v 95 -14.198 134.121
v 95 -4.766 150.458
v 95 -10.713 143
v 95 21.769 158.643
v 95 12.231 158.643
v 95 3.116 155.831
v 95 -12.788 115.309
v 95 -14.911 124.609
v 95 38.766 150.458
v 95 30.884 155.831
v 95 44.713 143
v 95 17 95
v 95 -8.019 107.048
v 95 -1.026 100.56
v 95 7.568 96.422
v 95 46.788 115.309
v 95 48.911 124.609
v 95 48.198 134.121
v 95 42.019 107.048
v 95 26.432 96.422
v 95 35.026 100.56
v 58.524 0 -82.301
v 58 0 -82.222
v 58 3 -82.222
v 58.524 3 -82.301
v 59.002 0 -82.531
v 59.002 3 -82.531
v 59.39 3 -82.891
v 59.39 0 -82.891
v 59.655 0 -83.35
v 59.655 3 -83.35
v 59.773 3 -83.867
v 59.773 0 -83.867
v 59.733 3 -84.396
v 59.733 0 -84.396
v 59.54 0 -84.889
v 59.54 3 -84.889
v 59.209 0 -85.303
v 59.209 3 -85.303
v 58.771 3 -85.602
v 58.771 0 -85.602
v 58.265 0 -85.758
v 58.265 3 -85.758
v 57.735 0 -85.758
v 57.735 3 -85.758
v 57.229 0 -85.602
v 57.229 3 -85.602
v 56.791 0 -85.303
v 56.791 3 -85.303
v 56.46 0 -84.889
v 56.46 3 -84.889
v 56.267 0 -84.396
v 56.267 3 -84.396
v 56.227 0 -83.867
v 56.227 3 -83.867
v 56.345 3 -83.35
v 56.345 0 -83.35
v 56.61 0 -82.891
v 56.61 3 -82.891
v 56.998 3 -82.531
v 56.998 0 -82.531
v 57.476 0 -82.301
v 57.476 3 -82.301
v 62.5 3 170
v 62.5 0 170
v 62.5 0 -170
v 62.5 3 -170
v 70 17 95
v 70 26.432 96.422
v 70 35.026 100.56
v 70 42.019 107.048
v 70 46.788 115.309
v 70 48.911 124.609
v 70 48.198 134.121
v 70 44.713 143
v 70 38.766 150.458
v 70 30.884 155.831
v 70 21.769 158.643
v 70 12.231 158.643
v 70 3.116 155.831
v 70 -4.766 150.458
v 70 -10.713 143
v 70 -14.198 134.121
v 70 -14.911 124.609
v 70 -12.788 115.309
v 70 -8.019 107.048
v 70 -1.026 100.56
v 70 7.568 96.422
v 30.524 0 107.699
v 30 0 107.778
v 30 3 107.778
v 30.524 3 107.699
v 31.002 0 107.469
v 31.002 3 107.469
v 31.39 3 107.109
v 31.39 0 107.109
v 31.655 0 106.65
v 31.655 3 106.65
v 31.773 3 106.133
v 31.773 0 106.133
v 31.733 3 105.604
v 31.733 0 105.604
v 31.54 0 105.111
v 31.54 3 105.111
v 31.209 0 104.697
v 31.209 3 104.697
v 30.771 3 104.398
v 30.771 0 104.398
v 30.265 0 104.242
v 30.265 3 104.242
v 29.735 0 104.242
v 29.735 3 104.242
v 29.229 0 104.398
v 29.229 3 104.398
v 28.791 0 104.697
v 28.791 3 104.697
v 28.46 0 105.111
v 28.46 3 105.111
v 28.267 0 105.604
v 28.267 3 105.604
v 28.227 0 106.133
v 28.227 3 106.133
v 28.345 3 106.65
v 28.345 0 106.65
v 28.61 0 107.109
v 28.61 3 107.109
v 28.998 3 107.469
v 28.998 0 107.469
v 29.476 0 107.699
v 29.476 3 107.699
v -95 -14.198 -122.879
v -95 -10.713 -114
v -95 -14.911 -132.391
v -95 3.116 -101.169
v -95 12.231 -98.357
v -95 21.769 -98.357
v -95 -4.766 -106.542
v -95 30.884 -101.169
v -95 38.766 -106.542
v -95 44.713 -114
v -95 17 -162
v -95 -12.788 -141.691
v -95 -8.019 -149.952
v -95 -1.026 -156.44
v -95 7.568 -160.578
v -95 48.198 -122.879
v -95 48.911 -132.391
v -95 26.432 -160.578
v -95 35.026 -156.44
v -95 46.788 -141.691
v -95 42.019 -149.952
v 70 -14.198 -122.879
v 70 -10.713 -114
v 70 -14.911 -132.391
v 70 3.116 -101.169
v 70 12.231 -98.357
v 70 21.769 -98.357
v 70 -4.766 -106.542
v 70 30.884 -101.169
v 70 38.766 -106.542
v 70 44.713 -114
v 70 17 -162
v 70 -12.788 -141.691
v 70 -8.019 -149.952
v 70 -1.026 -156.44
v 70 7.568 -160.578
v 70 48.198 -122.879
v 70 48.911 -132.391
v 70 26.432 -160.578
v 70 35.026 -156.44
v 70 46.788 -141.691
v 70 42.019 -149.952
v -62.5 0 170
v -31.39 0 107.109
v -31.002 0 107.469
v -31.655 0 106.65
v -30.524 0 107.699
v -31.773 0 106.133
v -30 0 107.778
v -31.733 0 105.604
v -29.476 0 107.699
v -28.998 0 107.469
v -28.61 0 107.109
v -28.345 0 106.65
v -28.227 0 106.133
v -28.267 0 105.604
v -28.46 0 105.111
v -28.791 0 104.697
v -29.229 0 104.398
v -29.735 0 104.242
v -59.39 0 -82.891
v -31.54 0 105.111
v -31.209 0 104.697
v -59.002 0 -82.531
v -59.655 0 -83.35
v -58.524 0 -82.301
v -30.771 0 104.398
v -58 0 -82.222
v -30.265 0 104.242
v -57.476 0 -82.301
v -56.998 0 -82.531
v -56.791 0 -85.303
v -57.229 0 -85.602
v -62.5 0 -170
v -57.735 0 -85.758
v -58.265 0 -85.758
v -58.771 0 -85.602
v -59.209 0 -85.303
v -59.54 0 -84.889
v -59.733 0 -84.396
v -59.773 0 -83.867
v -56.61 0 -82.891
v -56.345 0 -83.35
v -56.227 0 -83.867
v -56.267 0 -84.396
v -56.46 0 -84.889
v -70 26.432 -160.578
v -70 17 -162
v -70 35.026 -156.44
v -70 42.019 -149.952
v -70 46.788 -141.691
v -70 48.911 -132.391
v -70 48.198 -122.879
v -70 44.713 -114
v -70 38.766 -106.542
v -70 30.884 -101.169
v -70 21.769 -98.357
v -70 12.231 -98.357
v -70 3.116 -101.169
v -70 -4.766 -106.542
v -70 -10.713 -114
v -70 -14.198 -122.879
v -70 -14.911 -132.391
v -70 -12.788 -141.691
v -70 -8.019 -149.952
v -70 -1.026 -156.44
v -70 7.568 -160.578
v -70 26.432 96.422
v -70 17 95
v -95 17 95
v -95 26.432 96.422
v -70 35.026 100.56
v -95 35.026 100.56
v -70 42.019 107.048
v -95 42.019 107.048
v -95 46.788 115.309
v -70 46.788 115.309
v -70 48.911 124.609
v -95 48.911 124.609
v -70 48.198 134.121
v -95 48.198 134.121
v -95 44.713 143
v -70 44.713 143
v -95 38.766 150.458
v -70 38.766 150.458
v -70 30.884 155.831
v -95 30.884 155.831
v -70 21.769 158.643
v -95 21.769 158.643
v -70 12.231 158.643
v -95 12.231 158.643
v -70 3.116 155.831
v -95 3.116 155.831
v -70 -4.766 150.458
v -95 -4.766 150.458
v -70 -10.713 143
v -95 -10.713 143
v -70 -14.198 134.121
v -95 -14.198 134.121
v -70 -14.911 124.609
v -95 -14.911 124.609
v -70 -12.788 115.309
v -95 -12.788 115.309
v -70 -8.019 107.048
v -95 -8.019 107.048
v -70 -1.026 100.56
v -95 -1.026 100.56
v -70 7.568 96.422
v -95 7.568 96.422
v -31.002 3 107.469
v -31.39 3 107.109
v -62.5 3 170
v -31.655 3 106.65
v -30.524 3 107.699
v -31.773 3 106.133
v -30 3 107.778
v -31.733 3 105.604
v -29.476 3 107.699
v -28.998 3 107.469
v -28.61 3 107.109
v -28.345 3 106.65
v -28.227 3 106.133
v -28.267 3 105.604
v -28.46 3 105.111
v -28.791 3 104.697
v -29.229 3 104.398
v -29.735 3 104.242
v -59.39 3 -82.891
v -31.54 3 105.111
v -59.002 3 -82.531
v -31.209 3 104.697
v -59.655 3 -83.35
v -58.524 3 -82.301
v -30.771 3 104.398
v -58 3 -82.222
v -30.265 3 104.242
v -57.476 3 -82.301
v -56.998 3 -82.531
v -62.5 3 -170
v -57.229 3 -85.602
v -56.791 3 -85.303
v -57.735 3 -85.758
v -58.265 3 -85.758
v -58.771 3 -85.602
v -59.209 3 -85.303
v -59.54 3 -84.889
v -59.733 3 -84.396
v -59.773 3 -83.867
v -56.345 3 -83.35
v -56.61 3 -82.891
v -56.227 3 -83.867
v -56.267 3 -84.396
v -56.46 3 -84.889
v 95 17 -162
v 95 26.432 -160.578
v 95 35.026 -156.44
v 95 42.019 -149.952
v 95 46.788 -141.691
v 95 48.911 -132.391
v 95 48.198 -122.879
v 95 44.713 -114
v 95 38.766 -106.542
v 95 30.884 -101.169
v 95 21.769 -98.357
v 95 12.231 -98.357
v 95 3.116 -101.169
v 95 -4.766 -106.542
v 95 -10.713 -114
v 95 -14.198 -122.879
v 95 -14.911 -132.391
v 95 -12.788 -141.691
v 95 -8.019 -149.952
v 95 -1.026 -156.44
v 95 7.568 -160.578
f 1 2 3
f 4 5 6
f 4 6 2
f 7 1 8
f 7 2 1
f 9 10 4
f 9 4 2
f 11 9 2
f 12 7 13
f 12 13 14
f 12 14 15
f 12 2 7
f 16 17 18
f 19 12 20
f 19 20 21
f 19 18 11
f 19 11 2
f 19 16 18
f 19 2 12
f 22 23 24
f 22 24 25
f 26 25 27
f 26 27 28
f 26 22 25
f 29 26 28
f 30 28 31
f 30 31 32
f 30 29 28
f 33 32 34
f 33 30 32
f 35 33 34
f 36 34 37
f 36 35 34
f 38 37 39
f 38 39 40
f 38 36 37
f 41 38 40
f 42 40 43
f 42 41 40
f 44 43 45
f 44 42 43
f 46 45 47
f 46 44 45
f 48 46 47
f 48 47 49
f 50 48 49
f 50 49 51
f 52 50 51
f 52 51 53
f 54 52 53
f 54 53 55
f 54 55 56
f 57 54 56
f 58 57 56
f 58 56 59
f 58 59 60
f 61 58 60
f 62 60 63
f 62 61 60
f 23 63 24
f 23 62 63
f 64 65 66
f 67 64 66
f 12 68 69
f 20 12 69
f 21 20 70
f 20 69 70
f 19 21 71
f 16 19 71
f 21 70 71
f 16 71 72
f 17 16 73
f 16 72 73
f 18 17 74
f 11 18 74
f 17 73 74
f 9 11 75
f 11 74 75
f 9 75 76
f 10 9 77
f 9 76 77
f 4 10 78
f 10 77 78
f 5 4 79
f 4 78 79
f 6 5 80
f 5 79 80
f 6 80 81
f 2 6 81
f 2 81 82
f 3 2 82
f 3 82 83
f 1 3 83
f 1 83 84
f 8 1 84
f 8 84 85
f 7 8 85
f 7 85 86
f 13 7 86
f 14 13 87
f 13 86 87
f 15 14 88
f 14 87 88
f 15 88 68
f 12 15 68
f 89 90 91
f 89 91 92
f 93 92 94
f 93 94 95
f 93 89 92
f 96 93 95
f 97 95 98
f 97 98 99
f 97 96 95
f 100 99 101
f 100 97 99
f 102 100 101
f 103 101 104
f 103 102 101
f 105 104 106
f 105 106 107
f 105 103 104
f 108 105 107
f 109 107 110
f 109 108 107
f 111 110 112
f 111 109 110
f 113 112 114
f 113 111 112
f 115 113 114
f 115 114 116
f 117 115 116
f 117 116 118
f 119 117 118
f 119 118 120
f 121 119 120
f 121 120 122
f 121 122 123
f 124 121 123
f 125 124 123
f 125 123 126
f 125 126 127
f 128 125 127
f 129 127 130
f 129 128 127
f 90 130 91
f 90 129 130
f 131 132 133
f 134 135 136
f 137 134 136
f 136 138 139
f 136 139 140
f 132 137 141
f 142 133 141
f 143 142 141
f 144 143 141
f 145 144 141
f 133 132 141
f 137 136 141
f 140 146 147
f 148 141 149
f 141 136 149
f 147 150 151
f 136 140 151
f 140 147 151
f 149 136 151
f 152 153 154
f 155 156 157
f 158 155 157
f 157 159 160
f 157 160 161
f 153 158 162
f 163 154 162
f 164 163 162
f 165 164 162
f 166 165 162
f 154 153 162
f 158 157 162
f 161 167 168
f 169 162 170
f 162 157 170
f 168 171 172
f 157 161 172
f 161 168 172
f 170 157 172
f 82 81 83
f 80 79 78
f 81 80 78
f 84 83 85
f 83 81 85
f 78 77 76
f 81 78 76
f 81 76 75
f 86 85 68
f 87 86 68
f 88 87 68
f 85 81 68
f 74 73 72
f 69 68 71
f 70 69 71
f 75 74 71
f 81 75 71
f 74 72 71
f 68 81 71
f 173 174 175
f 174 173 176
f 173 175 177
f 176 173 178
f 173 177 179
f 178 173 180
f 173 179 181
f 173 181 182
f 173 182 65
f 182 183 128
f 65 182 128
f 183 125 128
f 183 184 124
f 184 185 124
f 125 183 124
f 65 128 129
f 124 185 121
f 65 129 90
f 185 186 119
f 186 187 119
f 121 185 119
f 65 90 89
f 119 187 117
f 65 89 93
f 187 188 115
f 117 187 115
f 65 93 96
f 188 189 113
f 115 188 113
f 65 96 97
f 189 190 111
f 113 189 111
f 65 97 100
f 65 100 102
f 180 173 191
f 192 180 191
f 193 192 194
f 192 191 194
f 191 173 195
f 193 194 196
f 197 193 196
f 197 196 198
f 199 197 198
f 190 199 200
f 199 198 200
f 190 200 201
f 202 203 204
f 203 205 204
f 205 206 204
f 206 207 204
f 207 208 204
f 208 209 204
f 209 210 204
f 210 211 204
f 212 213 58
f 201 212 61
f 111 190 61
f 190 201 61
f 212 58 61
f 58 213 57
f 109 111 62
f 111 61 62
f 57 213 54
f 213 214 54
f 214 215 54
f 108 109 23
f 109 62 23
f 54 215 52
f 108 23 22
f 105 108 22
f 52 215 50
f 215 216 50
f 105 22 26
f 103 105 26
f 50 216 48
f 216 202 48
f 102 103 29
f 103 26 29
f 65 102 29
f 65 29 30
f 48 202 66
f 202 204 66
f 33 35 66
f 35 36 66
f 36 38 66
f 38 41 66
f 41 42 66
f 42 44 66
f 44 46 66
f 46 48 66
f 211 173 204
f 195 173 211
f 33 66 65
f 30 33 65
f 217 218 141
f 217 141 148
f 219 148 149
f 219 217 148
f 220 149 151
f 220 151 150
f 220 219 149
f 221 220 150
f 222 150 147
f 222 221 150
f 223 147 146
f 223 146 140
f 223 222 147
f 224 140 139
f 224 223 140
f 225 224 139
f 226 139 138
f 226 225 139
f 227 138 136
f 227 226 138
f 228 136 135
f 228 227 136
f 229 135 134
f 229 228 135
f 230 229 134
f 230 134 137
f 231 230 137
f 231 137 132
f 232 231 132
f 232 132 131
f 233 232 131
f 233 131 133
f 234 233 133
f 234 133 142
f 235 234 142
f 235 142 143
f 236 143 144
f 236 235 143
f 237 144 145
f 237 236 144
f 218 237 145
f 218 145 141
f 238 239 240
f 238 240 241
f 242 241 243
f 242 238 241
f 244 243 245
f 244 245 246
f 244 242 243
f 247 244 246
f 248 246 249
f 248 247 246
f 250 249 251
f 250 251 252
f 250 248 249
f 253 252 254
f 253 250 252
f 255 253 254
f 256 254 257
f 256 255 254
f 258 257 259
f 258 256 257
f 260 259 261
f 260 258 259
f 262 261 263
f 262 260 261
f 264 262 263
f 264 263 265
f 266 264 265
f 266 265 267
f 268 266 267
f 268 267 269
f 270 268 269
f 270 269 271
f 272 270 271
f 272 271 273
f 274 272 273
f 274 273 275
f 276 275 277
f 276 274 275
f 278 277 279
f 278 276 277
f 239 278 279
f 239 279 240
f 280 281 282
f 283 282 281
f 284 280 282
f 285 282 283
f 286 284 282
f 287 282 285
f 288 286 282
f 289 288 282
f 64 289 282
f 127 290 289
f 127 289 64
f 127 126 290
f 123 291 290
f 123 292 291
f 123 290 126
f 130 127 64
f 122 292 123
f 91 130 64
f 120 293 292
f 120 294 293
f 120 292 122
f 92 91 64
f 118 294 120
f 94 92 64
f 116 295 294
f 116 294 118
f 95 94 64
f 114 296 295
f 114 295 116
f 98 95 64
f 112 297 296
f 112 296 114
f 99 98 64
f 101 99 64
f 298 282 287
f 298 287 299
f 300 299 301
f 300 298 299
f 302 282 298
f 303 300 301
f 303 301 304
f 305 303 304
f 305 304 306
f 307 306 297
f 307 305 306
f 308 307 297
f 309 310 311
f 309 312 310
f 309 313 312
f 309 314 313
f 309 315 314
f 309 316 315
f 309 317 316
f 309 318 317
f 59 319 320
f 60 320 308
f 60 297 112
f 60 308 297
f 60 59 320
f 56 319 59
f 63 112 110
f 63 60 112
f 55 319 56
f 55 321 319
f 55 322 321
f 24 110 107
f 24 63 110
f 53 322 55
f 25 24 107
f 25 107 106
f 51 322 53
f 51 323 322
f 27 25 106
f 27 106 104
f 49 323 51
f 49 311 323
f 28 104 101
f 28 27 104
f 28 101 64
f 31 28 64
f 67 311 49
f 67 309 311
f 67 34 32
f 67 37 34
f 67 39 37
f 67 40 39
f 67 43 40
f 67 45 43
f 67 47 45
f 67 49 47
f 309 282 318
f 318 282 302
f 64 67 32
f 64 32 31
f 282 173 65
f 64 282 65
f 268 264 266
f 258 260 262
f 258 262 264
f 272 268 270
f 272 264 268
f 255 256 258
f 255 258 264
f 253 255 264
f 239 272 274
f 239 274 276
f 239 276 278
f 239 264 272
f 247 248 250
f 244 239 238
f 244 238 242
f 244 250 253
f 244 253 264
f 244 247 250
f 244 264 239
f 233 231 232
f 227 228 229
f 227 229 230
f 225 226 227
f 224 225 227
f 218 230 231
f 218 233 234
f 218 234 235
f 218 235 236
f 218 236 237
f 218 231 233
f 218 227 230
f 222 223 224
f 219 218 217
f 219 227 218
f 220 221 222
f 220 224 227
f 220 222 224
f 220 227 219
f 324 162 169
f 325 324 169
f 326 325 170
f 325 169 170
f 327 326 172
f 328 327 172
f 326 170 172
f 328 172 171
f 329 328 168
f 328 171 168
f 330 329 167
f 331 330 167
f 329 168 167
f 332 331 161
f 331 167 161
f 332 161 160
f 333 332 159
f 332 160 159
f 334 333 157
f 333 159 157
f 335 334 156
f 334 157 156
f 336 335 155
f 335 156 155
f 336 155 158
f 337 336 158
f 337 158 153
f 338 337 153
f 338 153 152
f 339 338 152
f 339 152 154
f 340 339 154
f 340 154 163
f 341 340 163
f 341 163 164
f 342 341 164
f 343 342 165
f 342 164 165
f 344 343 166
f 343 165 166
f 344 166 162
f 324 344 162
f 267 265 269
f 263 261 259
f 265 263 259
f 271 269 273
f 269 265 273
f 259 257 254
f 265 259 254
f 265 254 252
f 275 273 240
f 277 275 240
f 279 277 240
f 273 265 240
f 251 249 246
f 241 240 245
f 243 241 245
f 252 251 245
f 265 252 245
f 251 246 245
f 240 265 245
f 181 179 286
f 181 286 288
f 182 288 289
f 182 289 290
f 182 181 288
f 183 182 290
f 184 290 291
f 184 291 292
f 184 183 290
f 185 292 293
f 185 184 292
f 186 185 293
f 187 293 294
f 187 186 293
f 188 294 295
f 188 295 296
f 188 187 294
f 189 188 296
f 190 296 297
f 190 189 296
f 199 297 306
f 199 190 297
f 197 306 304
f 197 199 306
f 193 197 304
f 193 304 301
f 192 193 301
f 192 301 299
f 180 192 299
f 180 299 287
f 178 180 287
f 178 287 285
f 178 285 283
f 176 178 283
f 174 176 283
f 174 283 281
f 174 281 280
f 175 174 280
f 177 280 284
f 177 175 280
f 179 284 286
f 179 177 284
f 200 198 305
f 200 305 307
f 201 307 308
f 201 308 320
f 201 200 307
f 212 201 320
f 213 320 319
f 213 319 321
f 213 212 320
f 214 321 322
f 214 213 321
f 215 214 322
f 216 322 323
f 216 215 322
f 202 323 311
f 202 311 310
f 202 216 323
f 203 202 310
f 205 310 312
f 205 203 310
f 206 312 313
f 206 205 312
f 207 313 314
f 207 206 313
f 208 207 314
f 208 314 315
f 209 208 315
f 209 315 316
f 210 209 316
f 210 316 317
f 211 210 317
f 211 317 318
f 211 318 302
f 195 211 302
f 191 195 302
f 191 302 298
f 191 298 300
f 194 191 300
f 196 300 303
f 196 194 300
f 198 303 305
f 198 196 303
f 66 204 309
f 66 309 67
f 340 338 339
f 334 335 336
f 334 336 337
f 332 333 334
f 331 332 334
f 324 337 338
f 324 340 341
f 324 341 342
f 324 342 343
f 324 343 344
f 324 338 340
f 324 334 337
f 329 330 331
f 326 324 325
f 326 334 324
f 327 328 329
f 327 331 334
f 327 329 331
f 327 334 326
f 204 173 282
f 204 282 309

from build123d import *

# Parameters (mm, degrees)
SKETCH1_W             = 125
SKETCH1_H             = 340
SKETCH1_R             = 1.778
BOSS_EXTRUDE1_DEPTH   = 3
BOSS_EXTRUDE2_START   = 70
SKETCH2_R             = 32
BOSS_EXTRUDE2_DEPTH   = 25
BOSS_EXTRUDE2_2_DEPTH = 25


with BuildPart() as part:
    # Sketch1 → Boss-Extrude1 (new body)
    with BuildSketch(Plane(origin=(0, 0, 0), x_dir=(1, 0, 0), z_dir=(0, 1, 0))):
        Rectangle(SKETCH1_W, SKETCH1_H)
        with Locations(Location((-58, 84, 0), (0, 0, 270))):
            Circle(SKETCH1_R, mode=Mode.SUBTRACT)
        with Locations(Location((58, 84, 0), (0, 0, 270))):
            Circle(SKETCH1_R, mode=Mode.SUBTRACT)
        with Locations(Location((-30, -106, 0), (0, 0, 270))):
            Circle(SKETCH1_R, mode=Mode.SUBTRACT)
        with Locations(Location((30, -106, 0), (0, 0, 270))):
            Circle(SKETCH1_R, mode=Mode.SUBTRACT)
    extrude(amount=BOSS_EXTRUDE1_DEPTH)


with BuildPart() as body_2:
    # Sketch2 → Boss-Extrude2 (new body)
    with BuildSketch(Plane(origin=(0, 0, 0), x_dir=(0, 0, -1), z_dir=(1, 0, 0)).offset(BOSS_EXTRUDE2_START)):
        with Locations((130, 17)):
            Circle(SKETCH2_R)
    extrude(amount=BOSS_EXTRUDE2_DEPTH)


with BuildPart() as body_3:
    # Sketch2 → Boss-Extrude2 2 (new body)
    with BuildSketch(Plane(origin=(0, 0, 0), x_dir=(0, 0, -1), z_dir=(1, 0, 0)).offset(BOSS_EXTRUDE2_START)):
        with Locations((-127, 17)):
            Circle(SKETCH2_R)
    extrude(amount=BOSS_EXTRUDE2_2_DEPTH)


with BuildPart() as body_4:
    # Mirror5: mirrored copy
    add(body_2.part.mirror(Plane(origin=(0, 0, 0), x_dir=(0, 0, 1), z_dir=(1, 0, 0))))


with BuildPart() as body_5:
    # Mirror5 2: mirrored copy
    add(body_3.part.mirror(Plane(origin=(0, 0, 0), x_dir=(0, 0, 1), z_dir=(1, 0, 0))))


solid = Compound([part.part, body_2.part, body_3.part, body_4.part, body_5.part])
